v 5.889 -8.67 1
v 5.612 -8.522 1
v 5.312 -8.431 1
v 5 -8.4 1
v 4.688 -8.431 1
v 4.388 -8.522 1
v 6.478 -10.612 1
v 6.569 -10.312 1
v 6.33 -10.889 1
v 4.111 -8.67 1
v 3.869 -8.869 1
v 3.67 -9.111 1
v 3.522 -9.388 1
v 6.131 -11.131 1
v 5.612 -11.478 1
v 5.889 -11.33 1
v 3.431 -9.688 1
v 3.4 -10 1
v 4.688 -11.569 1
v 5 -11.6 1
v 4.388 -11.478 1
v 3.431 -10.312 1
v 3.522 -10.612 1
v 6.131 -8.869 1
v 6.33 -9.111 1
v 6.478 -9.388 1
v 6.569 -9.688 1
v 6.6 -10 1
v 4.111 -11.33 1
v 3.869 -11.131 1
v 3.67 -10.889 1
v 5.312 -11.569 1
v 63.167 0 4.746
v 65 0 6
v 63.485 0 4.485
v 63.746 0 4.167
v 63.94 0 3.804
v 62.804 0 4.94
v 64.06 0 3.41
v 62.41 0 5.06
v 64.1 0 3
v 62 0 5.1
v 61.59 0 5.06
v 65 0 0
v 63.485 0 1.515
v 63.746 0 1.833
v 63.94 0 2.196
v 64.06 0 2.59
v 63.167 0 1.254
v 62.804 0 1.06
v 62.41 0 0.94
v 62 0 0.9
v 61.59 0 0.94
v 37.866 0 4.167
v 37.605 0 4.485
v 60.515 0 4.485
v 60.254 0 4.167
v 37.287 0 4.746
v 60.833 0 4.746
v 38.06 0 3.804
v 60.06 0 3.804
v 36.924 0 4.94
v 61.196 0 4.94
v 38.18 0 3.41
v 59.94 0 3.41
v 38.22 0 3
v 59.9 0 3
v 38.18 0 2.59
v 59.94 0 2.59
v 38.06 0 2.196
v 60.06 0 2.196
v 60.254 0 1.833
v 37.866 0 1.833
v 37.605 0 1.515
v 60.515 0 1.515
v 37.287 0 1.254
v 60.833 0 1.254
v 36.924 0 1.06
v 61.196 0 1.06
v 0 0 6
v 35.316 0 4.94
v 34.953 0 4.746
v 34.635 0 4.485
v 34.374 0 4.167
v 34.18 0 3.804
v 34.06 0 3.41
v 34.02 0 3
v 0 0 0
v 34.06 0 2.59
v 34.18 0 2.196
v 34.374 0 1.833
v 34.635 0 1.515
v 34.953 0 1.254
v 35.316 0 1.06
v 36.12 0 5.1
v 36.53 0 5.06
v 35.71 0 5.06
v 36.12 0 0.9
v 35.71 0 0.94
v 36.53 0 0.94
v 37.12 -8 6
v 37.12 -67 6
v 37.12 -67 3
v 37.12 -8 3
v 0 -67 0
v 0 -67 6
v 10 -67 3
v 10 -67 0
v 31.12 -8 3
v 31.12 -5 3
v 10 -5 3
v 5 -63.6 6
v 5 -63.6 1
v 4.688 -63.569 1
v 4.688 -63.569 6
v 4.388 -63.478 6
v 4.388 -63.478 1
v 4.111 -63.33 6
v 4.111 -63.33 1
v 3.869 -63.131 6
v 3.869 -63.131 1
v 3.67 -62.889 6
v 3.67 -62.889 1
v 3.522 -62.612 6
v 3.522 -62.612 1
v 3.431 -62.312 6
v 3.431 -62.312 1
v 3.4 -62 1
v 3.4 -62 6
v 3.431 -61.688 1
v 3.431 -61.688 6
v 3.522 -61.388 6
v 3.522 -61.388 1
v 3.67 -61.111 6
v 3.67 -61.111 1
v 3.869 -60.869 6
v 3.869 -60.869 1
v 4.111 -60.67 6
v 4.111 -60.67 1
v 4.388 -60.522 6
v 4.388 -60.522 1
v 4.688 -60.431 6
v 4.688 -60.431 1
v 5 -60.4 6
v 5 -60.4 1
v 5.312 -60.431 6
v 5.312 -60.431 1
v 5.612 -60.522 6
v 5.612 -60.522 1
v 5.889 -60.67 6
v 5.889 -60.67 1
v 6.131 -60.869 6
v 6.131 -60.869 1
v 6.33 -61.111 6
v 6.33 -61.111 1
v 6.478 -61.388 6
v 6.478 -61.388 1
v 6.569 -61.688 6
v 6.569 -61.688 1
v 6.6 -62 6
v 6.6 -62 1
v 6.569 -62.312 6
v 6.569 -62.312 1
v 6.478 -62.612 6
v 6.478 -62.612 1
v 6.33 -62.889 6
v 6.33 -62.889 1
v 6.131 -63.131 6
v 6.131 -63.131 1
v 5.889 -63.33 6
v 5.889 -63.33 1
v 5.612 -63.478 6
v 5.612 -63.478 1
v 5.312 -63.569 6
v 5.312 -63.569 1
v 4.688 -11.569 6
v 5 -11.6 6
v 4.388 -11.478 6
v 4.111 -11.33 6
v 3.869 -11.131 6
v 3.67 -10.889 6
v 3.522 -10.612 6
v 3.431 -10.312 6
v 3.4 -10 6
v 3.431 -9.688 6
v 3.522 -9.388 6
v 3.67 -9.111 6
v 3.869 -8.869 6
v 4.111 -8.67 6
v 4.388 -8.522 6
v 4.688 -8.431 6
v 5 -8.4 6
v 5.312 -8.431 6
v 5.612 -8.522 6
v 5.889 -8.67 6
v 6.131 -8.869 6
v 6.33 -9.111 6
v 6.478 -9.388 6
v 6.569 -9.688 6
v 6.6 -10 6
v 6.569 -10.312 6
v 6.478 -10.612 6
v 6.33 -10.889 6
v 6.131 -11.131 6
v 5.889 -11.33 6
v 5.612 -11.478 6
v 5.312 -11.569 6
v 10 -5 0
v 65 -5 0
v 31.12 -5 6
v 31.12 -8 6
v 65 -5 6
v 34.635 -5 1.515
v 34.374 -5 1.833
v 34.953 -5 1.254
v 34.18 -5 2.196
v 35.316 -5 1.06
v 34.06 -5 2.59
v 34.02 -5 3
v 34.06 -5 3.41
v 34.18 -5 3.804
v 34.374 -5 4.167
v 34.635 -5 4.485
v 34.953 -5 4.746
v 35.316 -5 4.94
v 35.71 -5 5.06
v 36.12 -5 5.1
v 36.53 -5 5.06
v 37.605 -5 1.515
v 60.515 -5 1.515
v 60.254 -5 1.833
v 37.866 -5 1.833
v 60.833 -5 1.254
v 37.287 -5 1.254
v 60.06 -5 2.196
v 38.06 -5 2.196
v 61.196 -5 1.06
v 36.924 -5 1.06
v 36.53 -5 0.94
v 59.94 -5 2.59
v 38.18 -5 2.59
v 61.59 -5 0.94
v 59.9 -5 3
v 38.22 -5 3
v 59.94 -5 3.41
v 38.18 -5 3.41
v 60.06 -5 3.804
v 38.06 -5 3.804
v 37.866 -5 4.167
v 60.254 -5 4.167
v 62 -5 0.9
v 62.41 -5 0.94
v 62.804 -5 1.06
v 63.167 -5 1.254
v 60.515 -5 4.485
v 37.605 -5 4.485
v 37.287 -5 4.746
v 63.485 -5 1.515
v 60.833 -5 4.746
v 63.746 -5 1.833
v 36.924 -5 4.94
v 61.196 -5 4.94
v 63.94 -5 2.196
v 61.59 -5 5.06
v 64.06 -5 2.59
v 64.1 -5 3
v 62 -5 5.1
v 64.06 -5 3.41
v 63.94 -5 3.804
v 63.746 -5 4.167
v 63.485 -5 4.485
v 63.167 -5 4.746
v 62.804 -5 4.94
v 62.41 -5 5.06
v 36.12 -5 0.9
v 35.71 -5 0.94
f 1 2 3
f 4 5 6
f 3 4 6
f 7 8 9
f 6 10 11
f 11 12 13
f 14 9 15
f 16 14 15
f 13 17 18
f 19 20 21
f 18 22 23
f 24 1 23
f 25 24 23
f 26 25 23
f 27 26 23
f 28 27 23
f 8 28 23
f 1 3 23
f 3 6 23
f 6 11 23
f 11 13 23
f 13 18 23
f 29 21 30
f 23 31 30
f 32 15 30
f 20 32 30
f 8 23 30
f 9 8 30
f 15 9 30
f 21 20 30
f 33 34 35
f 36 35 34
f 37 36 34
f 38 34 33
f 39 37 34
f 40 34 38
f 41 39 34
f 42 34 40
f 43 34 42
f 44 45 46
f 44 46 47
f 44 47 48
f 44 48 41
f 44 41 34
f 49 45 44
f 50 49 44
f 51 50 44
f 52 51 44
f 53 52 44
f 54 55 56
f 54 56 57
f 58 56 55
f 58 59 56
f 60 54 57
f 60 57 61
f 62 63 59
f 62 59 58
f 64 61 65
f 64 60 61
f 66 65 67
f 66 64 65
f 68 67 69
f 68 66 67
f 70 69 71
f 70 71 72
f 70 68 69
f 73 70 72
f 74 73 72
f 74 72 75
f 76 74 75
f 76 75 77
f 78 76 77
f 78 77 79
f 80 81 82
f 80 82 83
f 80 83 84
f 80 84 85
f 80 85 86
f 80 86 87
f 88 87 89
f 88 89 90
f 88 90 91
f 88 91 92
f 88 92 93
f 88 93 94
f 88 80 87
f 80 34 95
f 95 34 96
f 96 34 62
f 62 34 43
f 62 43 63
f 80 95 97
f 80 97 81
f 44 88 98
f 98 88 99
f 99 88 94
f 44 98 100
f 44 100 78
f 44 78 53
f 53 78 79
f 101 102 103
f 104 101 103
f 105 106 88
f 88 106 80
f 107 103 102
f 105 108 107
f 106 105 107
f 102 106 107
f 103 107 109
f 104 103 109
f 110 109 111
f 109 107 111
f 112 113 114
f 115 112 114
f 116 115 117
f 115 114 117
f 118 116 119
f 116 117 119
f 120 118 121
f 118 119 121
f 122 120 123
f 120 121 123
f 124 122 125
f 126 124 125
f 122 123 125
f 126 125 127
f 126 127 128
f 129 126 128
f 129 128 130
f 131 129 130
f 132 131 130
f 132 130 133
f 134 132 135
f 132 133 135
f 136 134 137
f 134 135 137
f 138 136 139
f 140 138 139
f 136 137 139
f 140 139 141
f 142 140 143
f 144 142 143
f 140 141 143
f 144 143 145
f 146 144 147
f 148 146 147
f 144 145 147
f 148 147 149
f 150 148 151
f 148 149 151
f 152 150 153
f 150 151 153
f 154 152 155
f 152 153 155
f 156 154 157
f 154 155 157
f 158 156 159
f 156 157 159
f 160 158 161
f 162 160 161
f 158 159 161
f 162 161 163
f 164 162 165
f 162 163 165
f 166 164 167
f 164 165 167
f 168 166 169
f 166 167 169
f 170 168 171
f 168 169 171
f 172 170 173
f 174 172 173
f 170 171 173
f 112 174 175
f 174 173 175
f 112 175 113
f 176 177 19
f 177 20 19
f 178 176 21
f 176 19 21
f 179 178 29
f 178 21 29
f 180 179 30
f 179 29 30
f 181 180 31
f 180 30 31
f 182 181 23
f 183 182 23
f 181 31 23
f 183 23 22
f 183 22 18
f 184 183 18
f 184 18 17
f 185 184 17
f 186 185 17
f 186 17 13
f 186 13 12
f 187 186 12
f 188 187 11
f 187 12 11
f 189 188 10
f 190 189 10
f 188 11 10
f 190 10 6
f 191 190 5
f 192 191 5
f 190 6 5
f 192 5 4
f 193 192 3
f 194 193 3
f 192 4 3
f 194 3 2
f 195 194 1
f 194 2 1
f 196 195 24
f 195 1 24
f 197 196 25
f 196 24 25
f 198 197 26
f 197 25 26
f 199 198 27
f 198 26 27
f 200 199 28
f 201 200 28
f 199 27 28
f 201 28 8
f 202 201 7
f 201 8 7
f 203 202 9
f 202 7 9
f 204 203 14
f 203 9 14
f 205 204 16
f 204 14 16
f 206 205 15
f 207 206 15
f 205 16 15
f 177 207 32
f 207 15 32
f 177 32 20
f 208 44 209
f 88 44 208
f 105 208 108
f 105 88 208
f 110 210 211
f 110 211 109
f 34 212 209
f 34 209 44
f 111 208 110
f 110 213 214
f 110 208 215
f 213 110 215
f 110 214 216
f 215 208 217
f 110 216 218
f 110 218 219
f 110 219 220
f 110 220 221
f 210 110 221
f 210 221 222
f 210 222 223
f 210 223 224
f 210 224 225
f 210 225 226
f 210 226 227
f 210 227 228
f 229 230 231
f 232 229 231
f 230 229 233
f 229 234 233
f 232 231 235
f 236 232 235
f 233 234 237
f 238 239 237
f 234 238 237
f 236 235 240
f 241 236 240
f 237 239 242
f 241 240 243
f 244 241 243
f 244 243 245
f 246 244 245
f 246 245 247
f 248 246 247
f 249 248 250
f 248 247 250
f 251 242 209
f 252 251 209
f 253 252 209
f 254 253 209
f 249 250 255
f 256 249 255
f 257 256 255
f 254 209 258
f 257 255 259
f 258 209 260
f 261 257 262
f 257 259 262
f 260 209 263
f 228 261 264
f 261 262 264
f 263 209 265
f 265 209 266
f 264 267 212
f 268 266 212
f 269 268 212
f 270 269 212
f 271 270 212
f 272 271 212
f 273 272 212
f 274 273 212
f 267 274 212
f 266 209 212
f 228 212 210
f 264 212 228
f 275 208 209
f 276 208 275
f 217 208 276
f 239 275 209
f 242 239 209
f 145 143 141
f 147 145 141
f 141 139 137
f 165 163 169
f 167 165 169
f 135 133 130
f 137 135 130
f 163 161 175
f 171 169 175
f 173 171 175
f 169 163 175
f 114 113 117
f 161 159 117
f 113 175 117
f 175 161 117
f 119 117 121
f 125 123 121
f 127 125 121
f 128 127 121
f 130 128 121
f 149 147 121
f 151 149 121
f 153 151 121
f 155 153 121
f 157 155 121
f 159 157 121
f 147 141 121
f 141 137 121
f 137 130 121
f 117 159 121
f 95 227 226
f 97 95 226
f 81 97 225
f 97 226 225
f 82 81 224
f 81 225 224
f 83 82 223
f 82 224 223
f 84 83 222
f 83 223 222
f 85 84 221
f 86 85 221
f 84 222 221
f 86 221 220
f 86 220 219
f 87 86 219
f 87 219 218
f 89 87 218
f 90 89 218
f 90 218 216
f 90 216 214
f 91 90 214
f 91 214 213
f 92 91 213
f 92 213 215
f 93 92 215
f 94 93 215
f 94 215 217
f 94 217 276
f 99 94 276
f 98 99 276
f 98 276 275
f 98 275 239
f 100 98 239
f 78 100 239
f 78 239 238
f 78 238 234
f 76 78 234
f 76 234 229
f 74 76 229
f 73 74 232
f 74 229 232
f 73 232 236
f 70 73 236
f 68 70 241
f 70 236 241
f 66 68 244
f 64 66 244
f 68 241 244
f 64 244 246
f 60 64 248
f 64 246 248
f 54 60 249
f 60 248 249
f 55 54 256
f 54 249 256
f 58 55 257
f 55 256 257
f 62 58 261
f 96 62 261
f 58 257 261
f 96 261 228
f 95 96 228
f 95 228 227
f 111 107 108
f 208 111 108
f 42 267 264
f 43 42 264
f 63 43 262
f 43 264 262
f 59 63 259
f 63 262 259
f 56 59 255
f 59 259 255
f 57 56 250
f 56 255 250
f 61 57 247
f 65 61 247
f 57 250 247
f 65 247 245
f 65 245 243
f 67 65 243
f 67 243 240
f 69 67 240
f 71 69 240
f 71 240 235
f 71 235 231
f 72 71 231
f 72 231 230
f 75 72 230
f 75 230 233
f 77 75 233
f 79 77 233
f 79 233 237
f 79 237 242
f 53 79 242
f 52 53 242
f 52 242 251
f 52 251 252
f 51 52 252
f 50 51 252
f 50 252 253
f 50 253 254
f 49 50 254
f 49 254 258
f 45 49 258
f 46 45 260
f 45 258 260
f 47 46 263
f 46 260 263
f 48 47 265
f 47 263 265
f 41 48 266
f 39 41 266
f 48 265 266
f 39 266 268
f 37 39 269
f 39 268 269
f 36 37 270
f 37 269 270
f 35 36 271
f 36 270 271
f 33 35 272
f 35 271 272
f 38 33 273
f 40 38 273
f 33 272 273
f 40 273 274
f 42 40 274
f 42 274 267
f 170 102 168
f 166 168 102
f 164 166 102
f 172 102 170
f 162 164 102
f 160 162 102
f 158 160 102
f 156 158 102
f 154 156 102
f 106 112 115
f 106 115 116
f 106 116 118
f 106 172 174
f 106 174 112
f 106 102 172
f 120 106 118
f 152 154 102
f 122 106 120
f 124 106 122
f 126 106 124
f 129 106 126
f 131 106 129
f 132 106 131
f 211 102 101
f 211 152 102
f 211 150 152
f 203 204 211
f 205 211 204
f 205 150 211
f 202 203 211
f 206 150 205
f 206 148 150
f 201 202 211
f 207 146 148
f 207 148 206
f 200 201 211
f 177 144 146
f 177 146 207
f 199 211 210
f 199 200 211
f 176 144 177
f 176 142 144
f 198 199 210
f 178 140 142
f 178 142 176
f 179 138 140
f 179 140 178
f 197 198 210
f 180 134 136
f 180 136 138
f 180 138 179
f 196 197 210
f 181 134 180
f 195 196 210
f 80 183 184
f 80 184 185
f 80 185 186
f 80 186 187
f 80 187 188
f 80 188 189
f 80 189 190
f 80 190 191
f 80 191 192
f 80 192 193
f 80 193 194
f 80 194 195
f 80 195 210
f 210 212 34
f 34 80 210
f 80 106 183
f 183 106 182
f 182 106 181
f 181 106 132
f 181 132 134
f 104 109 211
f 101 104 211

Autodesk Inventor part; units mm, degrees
sketch "Boceto2" plane through (0, 0, 0) normal (1, 0, 0) x (0, 1, 0)
  line L0 (0, 0) -> (-67, 0)
  line L1 (-67, 0) -> (-67, 6)
  line L2 (-67, 6) -> (0, 6)
  line L3 (0, 6) -> (0, 0)
  dimension "d2" = 67
  dimension "d3" = 6
extrude "Extrusión2" add sketch "Boceto2" along normal blind 65
sketch "Boceto3" plane through (65, 0, 0) normal (1, 0, 0) x (0, 0, -1)
  line L0 (-6, -5) -> (72, -5) projected
  line L1 (-6, -8) -> (-6, -5) projected
  line L2 (72, -8) -> (-6, -8) projected
  line L3 (72, -5) -> (72, -8) projected
  line L4 (-6, 0) -> (-6, -67) projected
  line L5 (-6, -67) -> (0, -67) projected
  line L6 (0, -67) -> (0, 0) projected
  line L7 (0, 0) -> (-6, 0) projected
  point P0 (0, -5)
ref_plane "Plano de trabajo1" through (31.12, -8, -69) normal (-1, 0, 0) x (0, 0, 1)
ref_plane "Plano de trabajo2" through (33.12, -8, -69) normal (-1, 0, 0) x (0, 0, 1)
ref_plane "Plano de trabajo4" through (31.12, -8, -72) normal (-1, 0, 0) x (0, 0, 1)
extrude "Extrusión3" cut sketch "Boceto3" against normal up to surface (33.88 mm away) contours L0 L6 L2 L1 | L2 L6 L5 L4
sketch "Boceto4" plane through (0, 0, 6) normal (0, 1, 0) x (1, 0, 0)
  circle A0 centre (34.12, 75) radius 1.5 projected
  circle A1 centre (62, 75) radius 1.5 projected
  line L0 (65, 0) -> (65, 78) projected
  line L1 (65, 78) -> (31.12, 78) projected
  line L2 (65, 0) -> (31.12, 0) projected
  line L3 (0, 6) -> (0, 0) projected
  line L4 (0, 0) -> (65, 0) projected
  line L5 (65, 6) -> (65, 0) projected
  line L6 (0, 6) -> (65, 6) projected
  line L7 (0, 0) -> (65, 0) projected
  line L8 (65, 0) -> (62, 0)
  line L9 (65, 0) -> (68, 0) construction
  line L10 (62, 0) -> (62, 3)
  circle A2 centre (62, 3) radius 2.1
  circle A3 centre (36.12, 3) radius 2.1
  circle A4 centre (36.12, 3) radius 1.5 projected
  circle A5 centre (62, 3) radius 1.5 projected
  line L11 (31.12, 0) -> (31.12, 78) projected
  point P0 (33.12, 0)
  dimension "d8" = 3
  dimension "d9" = 180
  dimension "d10" = 3
  dimension "d11" = 4.2
  dimension "d12" = 4.2
hole "Agujero1" at (36.12, 0, 3) at (62, 0, 3) direction (0, -1, 0) diameter 4.2 depth 5
sketch "Boceto5" plane through (0, -67, 6) normal (0, 0, 1) x (1, 0, 0)
  circle A0 centre (5, 57) radius 2.1 projected
  circle A1 centre (5, 5) radius 2.1 projected
  point P0 (0, 67)
hole "Agujero2" at (5, -10, 6) at (5, -62, 6) direction (0, 0, -1) diameter 3.2 depth 5
sketch "Boceto6" plane through (31.12, -67, 6) normal (1, 0, 0) x (0, 0, -1)
  line L0 (6, 62) -> (0, 62) projected
  line L1 (0, 0) -> (0, 62) projected
  line L2 (6, 0) -> (0, 0) projected
  line L3 (6, 62) -> (6, 0) projected
  line L4 (6, 0) -> (3, 0)
  line L5 (3, 0) -> (3, 62)
  line L6 (3, 62) -> (6, 62)
  line L7 (6, 62) -> (6, 0)
  point P0 (6, 67)
  point P1 (3, 0)
ref_plane "Plano de trabajo3" through (10, -67, -66) normal (1, 0, 0) x (0, 1, 0)
extrude "Extrusión4" cut sketch "Boceto6" against normal up to surface (21.12 mm away) contours L3 L2 L5 L0
sketch "Boceto7" plane through (31.12, -67, 6) normal (1, 0, 0) x (0, 0, -1)
  line L0 (3, 0) -> (3, 62) projected
  line L1 (3, 62) -> (0, 62) projected
  line L2 (0, 0) -> (0, 62) projected
  line L3 (3, 0) -> (0, 0) projected
  line L4 (0, 62) -> (78, 62) projected
  line L5 (0, 59) -> (0, 62) projected
  line L6 (78, 59) -> (0, 59) projected
  line L7 (78, 62) -> (78, 59) projected
  point P0 (6, 67)
  point P1 (3, 59)
extrude "Extrusión5" add sketch "Boceto7" along normal blind 6 contours L3 L2 L6 L0
properties part number "Lateral derecho"
